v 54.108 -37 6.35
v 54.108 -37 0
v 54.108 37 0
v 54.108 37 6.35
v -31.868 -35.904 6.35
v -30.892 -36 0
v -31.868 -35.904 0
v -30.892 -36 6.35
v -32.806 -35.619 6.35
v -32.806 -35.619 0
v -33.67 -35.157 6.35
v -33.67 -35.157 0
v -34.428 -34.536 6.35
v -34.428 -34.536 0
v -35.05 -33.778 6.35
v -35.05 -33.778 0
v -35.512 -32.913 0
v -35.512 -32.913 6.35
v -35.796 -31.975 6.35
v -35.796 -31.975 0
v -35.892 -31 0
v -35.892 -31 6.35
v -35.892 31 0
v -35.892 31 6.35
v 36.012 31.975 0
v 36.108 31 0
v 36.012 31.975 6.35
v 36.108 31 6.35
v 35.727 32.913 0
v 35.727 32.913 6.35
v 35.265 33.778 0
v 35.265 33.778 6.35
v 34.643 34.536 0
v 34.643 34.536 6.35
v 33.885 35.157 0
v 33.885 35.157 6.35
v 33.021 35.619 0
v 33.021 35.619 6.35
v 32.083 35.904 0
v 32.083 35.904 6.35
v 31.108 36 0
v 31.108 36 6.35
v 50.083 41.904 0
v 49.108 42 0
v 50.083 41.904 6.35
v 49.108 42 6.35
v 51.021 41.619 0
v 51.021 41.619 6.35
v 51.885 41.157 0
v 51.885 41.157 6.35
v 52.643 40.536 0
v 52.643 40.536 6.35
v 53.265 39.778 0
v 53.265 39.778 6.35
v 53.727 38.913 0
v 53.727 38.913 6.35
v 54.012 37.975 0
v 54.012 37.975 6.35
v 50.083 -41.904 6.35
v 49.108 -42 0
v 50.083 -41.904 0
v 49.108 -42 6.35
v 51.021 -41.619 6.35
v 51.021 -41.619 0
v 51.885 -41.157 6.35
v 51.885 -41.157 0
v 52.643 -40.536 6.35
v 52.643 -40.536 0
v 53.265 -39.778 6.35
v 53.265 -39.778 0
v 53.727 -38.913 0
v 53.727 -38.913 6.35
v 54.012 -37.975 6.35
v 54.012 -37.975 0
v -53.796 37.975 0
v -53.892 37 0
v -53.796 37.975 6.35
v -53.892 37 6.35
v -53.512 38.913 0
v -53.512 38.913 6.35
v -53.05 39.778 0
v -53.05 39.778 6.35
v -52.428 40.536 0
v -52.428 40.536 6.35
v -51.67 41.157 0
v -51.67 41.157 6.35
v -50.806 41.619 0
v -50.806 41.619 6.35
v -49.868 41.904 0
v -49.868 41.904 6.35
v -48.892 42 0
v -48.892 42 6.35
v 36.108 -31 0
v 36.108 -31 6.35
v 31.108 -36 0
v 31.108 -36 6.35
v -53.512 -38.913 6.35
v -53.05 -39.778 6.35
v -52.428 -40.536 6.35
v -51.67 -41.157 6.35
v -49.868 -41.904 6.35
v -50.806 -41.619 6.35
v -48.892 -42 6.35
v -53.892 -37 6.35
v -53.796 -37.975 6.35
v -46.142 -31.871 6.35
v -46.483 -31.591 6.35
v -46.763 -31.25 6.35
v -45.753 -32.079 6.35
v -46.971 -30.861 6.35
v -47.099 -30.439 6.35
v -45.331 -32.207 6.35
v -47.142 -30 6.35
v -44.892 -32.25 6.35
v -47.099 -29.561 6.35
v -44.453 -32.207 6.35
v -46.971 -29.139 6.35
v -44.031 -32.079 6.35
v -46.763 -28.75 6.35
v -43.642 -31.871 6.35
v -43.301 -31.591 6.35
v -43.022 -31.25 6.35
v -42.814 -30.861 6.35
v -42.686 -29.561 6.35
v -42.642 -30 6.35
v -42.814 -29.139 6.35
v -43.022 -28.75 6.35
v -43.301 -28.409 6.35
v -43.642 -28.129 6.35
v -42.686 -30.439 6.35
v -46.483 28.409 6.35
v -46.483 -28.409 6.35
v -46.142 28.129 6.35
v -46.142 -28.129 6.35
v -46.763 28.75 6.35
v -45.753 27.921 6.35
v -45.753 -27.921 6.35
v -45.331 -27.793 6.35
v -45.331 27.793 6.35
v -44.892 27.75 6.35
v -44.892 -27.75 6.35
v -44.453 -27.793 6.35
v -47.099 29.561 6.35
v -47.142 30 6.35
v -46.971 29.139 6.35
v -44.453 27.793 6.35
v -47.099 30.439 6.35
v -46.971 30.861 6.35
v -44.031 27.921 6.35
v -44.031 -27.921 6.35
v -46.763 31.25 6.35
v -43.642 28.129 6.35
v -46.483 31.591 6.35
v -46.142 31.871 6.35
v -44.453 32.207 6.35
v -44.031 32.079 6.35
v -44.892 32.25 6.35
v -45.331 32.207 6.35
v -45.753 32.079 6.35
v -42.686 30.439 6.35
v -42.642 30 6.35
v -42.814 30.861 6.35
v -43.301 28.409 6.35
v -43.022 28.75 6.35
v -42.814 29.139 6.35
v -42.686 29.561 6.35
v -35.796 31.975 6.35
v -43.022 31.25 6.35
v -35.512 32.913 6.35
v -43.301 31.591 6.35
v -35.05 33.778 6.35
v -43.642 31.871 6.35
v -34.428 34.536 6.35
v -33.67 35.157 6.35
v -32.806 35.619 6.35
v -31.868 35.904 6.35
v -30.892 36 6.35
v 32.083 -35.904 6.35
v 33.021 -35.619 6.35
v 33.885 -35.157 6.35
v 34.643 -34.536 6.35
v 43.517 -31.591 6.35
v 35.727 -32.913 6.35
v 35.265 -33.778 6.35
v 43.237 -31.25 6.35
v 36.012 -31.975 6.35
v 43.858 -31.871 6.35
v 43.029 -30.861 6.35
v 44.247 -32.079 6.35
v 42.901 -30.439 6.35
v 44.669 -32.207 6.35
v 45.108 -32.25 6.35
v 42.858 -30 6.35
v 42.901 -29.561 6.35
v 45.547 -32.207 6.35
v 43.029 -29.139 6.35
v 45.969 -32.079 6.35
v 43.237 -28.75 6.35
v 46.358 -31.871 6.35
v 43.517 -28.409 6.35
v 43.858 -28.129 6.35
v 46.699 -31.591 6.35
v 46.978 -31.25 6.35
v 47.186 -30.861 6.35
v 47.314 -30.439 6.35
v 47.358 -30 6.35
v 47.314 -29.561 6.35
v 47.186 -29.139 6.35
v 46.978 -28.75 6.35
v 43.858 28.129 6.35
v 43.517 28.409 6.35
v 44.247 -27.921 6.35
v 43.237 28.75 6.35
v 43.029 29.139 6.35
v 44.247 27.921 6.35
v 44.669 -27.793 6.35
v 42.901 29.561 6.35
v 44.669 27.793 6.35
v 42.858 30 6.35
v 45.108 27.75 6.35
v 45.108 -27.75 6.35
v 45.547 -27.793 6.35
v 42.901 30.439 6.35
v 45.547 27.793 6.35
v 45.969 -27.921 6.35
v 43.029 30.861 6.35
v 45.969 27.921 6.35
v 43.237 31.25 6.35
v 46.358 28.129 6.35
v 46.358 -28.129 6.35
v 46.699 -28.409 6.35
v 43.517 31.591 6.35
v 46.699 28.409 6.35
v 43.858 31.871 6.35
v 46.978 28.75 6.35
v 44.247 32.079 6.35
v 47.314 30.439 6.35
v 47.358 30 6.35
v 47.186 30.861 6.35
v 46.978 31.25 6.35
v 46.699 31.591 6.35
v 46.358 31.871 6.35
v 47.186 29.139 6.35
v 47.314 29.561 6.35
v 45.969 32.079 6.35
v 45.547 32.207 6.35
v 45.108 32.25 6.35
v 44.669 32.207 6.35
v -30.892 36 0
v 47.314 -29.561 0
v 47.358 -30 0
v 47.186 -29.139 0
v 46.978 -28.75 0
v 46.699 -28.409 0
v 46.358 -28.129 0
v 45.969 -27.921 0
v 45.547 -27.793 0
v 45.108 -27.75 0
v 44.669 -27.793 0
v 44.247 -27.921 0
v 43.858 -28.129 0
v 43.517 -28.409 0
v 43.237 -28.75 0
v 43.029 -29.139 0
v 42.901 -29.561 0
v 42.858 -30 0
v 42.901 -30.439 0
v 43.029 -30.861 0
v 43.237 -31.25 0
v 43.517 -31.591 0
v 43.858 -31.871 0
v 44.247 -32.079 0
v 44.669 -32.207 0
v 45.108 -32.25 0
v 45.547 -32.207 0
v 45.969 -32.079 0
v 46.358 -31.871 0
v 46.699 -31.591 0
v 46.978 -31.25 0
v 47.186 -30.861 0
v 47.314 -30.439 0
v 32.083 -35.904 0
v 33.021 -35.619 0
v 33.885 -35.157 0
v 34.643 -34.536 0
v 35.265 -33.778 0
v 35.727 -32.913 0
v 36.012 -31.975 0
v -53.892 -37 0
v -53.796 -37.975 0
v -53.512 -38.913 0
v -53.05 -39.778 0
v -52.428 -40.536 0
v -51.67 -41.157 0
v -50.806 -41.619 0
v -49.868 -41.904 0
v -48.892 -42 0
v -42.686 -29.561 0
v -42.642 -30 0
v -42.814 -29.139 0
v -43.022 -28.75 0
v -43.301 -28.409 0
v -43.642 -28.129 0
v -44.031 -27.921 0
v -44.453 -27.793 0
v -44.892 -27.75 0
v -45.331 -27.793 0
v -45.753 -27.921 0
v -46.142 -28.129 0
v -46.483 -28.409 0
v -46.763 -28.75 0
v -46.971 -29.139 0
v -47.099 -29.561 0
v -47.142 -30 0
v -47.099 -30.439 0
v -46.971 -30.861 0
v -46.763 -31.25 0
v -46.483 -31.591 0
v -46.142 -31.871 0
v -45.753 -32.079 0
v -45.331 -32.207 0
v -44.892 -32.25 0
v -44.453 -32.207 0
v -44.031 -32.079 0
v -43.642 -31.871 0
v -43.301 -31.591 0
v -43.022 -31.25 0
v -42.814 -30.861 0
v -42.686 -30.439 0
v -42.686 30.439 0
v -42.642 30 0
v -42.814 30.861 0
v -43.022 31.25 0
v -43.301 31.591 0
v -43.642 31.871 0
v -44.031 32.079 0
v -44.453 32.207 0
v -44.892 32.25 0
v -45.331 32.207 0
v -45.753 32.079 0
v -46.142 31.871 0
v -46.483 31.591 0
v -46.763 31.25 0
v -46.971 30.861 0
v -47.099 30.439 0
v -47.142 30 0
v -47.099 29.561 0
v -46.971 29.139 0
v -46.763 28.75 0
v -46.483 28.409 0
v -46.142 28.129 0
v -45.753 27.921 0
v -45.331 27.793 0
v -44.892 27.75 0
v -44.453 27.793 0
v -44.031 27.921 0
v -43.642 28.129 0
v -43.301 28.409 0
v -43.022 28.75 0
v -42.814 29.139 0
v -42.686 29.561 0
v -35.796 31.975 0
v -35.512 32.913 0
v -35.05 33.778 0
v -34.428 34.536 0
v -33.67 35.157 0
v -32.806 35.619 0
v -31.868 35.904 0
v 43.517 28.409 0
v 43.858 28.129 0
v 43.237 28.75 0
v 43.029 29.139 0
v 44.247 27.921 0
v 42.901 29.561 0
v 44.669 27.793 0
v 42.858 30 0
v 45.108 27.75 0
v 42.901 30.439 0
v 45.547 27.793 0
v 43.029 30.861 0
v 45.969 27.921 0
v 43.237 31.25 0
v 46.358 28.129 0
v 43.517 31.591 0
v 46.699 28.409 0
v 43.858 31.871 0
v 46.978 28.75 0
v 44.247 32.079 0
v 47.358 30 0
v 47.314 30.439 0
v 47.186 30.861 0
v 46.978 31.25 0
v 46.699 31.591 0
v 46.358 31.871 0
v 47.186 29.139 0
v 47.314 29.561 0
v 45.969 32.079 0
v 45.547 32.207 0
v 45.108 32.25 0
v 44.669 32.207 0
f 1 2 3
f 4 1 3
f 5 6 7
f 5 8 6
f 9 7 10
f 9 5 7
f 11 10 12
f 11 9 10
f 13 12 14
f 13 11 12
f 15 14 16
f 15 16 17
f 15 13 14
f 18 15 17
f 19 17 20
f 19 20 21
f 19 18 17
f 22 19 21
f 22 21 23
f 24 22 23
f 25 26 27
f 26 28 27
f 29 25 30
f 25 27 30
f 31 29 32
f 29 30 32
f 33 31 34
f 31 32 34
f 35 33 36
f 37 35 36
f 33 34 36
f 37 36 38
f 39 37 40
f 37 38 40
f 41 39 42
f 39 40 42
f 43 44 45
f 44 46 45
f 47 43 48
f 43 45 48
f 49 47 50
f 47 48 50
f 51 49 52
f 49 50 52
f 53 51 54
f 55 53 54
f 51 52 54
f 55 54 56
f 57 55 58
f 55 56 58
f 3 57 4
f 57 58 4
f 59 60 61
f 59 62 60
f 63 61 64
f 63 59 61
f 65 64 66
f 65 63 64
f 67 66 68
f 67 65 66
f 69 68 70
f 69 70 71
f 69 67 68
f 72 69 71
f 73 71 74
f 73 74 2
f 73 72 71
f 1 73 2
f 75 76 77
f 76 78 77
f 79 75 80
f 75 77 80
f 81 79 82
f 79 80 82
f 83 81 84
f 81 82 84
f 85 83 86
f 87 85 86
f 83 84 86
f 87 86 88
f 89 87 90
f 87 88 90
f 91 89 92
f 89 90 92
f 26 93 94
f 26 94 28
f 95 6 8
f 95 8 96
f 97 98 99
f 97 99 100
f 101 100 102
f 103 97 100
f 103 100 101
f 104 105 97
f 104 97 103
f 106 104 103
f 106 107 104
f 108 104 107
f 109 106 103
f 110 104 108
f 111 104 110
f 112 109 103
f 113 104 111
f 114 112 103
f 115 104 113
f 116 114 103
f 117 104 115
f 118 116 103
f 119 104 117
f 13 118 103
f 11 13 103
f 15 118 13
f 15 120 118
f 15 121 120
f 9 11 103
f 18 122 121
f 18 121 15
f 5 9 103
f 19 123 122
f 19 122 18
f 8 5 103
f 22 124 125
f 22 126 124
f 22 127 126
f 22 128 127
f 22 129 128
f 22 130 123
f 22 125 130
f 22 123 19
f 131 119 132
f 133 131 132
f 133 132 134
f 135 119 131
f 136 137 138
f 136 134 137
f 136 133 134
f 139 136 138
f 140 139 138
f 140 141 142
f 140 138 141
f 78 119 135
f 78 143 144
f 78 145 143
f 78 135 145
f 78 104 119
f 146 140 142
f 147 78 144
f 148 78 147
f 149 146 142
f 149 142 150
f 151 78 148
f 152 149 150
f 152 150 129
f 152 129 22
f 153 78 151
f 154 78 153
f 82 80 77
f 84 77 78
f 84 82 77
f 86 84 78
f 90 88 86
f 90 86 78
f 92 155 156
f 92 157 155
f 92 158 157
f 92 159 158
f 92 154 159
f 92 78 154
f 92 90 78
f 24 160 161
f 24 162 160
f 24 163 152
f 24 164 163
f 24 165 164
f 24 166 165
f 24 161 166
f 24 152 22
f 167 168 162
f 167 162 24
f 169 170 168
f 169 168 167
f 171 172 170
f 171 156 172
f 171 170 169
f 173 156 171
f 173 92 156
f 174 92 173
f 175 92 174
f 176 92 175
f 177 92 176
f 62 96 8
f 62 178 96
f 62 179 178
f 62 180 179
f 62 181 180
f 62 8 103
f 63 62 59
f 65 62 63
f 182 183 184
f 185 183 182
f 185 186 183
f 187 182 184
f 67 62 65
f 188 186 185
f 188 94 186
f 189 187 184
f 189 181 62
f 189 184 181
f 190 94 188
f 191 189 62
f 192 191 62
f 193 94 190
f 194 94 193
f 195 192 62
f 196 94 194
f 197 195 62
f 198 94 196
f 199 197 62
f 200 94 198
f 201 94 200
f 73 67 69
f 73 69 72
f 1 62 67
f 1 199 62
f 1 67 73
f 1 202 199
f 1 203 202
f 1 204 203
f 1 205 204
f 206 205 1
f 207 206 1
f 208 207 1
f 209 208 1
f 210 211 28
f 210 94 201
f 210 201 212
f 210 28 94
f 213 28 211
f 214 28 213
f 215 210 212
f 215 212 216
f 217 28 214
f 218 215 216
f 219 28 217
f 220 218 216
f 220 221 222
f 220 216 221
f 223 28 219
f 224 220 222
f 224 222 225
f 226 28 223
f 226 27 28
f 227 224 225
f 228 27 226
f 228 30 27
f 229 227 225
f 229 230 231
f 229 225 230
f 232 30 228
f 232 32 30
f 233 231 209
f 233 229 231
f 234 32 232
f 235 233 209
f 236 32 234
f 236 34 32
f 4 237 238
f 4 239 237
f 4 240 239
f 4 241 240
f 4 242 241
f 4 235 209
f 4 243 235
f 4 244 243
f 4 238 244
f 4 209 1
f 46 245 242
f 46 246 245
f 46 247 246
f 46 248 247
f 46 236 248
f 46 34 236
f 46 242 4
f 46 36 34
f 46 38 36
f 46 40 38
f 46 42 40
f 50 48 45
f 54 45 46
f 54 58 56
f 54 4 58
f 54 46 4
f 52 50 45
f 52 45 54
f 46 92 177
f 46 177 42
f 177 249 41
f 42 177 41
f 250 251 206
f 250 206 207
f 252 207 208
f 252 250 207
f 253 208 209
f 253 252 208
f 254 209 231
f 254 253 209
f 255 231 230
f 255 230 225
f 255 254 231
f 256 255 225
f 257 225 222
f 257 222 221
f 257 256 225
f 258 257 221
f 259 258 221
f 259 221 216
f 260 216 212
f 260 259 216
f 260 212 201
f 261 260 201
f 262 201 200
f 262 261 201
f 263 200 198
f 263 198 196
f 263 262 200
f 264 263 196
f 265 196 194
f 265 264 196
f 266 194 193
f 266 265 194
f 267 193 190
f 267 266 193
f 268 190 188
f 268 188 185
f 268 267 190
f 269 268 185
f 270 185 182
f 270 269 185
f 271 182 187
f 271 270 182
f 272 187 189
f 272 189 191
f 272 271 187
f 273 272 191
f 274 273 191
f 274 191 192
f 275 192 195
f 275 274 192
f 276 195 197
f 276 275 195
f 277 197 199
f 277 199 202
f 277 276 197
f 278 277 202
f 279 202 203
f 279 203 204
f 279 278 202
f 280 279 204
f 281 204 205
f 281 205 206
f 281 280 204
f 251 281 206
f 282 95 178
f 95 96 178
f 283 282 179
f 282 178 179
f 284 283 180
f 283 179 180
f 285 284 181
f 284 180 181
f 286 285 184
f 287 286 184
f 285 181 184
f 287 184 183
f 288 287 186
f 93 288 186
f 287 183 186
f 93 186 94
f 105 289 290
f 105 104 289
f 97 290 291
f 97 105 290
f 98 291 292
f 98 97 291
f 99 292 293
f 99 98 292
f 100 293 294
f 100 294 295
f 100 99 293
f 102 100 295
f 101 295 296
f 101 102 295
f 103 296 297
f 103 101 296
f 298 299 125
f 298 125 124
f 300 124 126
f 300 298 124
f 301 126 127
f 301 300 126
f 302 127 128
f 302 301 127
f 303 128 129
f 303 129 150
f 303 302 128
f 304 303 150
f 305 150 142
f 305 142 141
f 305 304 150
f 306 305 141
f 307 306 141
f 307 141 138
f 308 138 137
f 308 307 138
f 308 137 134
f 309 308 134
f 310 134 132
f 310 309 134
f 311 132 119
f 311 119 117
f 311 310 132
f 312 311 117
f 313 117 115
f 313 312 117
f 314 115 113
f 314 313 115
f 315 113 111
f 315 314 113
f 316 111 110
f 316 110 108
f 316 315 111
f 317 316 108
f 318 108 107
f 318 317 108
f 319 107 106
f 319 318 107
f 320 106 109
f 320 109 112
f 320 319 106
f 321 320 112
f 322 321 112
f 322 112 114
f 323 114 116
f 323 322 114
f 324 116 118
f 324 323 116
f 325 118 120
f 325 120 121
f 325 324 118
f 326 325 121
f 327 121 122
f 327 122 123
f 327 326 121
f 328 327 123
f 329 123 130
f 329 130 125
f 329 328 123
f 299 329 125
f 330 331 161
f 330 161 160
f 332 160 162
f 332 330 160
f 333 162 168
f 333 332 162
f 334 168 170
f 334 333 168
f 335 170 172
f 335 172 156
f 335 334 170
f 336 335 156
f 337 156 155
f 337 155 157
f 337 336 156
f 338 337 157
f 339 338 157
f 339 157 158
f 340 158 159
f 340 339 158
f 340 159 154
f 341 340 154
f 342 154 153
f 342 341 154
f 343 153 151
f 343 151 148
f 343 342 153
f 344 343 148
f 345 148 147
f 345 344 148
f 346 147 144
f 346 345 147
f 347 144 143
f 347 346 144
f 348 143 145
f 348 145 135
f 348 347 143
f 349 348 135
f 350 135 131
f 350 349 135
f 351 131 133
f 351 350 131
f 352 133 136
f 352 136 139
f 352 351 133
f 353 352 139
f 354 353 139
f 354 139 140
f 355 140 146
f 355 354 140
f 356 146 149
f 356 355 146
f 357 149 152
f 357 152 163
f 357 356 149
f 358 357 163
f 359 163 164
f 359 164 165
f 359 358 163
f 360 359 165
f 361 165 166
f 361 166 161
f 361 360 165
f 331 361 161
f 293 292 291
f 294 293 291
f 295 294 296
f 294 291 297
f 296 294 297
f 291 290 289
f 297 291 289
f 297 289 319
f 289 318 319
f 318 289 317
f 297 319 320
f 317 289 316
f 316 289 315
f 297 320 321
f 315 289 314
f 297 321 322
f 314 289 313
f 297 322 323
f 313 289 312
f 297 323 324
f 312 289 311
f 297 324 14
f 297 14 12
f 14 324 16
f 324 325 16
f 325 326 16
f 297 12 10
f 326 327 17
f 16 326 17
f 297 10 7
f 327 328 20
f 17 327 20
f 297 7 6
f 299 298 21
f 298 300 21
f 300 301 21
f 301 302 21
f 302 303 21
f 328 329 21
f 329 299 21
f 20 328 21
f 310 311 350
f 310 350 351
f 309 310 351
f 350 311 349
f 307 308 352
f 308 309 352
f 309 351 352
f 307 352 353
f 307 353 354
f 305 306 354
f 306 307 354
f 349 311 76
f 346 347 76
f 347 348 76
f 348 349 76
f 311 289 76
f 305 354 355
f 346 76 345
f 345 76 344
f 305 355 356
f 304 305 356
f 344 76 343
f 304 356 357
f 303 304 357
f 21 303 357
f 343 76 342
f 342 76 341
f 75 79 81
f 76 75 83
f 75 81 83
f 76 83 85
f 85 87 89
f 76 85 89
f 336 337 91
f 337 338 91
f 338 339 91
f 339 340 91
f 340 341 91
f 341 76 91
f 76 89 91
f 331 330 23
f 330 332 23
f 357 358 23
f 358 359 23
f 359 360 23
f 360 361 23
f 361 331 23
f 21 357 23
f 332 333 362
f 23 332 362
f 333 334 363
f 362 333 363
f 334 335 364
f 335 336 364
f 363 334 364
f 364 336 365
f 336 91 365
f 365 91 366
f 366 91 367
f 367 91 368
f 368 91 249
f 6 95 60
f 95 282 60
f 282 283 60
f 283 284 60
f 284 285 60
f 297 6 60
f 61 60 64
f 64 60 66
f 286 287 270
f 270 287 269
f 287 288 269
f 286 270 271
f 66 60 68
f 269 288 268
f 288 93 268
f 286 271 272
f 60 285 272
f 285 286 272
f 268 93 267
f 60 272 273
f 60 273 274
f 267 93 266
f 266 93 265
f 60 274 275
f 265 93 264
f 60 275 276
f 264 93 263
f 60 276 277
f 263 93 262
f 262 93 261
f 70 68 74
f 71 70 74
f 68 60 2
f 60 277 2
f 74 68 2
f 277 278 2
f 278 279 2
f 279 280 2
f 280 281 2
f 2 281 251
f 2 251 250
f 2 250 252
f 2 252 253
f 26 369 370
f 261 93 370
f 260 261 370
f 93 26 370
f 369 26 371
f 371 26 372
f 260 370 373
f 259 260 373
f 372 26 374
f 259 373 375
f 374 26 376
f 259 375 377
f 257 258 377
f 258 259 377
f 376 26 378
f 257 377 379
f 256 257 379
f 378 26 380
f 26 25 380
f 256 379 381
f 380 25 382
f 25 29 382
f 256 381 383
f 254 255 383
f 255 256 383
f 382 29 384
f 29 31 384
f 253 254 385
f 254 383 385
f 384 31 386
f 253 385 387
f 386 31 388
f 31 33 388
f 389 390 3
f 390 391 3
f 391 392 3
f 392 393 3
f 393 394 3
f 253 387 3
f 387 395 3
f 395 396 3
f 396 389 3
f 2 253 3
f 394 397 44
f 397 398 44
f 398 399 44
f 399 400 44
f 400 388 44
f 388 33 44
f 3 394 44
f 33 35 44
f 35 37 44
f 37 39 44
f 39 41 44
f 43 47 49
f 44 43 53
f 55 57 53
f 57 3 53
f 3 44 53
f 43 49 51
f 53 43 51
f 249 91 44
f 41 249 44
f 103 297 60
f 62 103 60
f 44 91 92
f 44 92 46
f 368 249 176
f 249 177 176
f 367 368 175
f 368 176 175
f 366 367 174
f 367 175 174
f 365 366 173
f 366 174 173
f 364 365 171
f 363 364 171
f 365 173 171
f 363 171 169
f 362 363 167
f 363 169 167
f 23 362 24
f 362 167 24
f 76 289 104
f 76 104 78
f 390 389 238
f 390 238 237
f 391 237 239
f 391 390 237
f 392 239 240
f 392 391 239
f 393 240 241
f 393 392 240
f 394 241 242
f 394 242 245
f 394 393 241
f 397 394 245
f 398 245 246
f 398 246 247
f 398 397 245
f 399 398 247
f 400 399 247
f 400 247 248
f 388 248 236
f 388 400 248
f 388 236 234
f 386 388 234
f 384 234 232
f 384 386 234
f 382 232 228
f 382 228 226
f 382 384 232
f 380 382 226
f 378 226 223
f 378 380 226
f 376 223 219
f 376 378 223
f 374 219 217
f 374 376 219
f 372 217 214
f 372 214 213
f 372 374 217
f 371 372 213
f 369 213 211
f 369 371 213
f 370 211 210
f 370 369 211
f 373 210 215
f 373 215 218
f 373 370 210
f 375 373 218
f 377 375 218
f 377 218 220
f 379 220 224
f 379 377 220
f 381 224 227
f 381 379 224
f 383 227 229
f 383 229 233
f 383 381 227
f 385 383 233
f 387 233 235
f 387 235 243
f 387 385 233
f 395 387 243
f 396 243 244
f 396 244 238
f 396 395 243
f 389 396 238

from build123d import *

# Parameters (mm, degrees)
SKETCH1_W           = 108
SKETCH1_H           = 84
SKETCH1_R           = 2.25
SKETCH1_W_2         = 72
SKETCH1_H_2         = 72
BOSS_EXTRUDE1_DEPTH = 6.35
FILLET1_R           = 5


with BuildPart() as part:
    # Sketch1 → Boss-Extrude1 (new body)
    with BuildSketch(Plane.XY):
        with Locations((0.107594743, 0)):
            Rectangle(SKETCH1_W, SKETCH1_H)
        with Locations((-44.892405257, 30)):
            Circle(SKETCH1_R, mode=Mode.SUBTRACT)
        with Locations((45.107594743, 30)):
            Circle(SKETCH1_R, mode=Mode.SUBTRACT)
        with Locations((45.107594743, -30)):
            Circle(SKETCH1_R, mode=Mode.SUBTRACT)
        with Locations((-44.892405257, -30)):
            Circle(SKETCH1_R, mode=Mode.SUBTRACT)
        with Locations((0.107594743, 0)):
            Rectangle(SKETCH1_W_2, SKETCH1_H_2, mode=Mode.SUBTRACT)
    extrude(amount=BOSS_EXTRUDE1_DEPTH)

    # Fillet1
    fillet1_edges = [part.edges().sort_by_distance(p)[0] for p in [
        (-35.892405257, 36, 3.175),
        (-35.892405257, -36, 3.175),
        (36.107594743, -36, 3.175),
        (36.107594743, 36, 3.175),
        (-53.892405257, 42, 3.175),
        (54.107594743, 42, 3.175),
        (54.107594743, -42, 3.175),
        (-53.892405257, -42, 3.175),
    ]]
    fillet(fillet1_edges, radius=FILLET1_R)


solid = part.part
